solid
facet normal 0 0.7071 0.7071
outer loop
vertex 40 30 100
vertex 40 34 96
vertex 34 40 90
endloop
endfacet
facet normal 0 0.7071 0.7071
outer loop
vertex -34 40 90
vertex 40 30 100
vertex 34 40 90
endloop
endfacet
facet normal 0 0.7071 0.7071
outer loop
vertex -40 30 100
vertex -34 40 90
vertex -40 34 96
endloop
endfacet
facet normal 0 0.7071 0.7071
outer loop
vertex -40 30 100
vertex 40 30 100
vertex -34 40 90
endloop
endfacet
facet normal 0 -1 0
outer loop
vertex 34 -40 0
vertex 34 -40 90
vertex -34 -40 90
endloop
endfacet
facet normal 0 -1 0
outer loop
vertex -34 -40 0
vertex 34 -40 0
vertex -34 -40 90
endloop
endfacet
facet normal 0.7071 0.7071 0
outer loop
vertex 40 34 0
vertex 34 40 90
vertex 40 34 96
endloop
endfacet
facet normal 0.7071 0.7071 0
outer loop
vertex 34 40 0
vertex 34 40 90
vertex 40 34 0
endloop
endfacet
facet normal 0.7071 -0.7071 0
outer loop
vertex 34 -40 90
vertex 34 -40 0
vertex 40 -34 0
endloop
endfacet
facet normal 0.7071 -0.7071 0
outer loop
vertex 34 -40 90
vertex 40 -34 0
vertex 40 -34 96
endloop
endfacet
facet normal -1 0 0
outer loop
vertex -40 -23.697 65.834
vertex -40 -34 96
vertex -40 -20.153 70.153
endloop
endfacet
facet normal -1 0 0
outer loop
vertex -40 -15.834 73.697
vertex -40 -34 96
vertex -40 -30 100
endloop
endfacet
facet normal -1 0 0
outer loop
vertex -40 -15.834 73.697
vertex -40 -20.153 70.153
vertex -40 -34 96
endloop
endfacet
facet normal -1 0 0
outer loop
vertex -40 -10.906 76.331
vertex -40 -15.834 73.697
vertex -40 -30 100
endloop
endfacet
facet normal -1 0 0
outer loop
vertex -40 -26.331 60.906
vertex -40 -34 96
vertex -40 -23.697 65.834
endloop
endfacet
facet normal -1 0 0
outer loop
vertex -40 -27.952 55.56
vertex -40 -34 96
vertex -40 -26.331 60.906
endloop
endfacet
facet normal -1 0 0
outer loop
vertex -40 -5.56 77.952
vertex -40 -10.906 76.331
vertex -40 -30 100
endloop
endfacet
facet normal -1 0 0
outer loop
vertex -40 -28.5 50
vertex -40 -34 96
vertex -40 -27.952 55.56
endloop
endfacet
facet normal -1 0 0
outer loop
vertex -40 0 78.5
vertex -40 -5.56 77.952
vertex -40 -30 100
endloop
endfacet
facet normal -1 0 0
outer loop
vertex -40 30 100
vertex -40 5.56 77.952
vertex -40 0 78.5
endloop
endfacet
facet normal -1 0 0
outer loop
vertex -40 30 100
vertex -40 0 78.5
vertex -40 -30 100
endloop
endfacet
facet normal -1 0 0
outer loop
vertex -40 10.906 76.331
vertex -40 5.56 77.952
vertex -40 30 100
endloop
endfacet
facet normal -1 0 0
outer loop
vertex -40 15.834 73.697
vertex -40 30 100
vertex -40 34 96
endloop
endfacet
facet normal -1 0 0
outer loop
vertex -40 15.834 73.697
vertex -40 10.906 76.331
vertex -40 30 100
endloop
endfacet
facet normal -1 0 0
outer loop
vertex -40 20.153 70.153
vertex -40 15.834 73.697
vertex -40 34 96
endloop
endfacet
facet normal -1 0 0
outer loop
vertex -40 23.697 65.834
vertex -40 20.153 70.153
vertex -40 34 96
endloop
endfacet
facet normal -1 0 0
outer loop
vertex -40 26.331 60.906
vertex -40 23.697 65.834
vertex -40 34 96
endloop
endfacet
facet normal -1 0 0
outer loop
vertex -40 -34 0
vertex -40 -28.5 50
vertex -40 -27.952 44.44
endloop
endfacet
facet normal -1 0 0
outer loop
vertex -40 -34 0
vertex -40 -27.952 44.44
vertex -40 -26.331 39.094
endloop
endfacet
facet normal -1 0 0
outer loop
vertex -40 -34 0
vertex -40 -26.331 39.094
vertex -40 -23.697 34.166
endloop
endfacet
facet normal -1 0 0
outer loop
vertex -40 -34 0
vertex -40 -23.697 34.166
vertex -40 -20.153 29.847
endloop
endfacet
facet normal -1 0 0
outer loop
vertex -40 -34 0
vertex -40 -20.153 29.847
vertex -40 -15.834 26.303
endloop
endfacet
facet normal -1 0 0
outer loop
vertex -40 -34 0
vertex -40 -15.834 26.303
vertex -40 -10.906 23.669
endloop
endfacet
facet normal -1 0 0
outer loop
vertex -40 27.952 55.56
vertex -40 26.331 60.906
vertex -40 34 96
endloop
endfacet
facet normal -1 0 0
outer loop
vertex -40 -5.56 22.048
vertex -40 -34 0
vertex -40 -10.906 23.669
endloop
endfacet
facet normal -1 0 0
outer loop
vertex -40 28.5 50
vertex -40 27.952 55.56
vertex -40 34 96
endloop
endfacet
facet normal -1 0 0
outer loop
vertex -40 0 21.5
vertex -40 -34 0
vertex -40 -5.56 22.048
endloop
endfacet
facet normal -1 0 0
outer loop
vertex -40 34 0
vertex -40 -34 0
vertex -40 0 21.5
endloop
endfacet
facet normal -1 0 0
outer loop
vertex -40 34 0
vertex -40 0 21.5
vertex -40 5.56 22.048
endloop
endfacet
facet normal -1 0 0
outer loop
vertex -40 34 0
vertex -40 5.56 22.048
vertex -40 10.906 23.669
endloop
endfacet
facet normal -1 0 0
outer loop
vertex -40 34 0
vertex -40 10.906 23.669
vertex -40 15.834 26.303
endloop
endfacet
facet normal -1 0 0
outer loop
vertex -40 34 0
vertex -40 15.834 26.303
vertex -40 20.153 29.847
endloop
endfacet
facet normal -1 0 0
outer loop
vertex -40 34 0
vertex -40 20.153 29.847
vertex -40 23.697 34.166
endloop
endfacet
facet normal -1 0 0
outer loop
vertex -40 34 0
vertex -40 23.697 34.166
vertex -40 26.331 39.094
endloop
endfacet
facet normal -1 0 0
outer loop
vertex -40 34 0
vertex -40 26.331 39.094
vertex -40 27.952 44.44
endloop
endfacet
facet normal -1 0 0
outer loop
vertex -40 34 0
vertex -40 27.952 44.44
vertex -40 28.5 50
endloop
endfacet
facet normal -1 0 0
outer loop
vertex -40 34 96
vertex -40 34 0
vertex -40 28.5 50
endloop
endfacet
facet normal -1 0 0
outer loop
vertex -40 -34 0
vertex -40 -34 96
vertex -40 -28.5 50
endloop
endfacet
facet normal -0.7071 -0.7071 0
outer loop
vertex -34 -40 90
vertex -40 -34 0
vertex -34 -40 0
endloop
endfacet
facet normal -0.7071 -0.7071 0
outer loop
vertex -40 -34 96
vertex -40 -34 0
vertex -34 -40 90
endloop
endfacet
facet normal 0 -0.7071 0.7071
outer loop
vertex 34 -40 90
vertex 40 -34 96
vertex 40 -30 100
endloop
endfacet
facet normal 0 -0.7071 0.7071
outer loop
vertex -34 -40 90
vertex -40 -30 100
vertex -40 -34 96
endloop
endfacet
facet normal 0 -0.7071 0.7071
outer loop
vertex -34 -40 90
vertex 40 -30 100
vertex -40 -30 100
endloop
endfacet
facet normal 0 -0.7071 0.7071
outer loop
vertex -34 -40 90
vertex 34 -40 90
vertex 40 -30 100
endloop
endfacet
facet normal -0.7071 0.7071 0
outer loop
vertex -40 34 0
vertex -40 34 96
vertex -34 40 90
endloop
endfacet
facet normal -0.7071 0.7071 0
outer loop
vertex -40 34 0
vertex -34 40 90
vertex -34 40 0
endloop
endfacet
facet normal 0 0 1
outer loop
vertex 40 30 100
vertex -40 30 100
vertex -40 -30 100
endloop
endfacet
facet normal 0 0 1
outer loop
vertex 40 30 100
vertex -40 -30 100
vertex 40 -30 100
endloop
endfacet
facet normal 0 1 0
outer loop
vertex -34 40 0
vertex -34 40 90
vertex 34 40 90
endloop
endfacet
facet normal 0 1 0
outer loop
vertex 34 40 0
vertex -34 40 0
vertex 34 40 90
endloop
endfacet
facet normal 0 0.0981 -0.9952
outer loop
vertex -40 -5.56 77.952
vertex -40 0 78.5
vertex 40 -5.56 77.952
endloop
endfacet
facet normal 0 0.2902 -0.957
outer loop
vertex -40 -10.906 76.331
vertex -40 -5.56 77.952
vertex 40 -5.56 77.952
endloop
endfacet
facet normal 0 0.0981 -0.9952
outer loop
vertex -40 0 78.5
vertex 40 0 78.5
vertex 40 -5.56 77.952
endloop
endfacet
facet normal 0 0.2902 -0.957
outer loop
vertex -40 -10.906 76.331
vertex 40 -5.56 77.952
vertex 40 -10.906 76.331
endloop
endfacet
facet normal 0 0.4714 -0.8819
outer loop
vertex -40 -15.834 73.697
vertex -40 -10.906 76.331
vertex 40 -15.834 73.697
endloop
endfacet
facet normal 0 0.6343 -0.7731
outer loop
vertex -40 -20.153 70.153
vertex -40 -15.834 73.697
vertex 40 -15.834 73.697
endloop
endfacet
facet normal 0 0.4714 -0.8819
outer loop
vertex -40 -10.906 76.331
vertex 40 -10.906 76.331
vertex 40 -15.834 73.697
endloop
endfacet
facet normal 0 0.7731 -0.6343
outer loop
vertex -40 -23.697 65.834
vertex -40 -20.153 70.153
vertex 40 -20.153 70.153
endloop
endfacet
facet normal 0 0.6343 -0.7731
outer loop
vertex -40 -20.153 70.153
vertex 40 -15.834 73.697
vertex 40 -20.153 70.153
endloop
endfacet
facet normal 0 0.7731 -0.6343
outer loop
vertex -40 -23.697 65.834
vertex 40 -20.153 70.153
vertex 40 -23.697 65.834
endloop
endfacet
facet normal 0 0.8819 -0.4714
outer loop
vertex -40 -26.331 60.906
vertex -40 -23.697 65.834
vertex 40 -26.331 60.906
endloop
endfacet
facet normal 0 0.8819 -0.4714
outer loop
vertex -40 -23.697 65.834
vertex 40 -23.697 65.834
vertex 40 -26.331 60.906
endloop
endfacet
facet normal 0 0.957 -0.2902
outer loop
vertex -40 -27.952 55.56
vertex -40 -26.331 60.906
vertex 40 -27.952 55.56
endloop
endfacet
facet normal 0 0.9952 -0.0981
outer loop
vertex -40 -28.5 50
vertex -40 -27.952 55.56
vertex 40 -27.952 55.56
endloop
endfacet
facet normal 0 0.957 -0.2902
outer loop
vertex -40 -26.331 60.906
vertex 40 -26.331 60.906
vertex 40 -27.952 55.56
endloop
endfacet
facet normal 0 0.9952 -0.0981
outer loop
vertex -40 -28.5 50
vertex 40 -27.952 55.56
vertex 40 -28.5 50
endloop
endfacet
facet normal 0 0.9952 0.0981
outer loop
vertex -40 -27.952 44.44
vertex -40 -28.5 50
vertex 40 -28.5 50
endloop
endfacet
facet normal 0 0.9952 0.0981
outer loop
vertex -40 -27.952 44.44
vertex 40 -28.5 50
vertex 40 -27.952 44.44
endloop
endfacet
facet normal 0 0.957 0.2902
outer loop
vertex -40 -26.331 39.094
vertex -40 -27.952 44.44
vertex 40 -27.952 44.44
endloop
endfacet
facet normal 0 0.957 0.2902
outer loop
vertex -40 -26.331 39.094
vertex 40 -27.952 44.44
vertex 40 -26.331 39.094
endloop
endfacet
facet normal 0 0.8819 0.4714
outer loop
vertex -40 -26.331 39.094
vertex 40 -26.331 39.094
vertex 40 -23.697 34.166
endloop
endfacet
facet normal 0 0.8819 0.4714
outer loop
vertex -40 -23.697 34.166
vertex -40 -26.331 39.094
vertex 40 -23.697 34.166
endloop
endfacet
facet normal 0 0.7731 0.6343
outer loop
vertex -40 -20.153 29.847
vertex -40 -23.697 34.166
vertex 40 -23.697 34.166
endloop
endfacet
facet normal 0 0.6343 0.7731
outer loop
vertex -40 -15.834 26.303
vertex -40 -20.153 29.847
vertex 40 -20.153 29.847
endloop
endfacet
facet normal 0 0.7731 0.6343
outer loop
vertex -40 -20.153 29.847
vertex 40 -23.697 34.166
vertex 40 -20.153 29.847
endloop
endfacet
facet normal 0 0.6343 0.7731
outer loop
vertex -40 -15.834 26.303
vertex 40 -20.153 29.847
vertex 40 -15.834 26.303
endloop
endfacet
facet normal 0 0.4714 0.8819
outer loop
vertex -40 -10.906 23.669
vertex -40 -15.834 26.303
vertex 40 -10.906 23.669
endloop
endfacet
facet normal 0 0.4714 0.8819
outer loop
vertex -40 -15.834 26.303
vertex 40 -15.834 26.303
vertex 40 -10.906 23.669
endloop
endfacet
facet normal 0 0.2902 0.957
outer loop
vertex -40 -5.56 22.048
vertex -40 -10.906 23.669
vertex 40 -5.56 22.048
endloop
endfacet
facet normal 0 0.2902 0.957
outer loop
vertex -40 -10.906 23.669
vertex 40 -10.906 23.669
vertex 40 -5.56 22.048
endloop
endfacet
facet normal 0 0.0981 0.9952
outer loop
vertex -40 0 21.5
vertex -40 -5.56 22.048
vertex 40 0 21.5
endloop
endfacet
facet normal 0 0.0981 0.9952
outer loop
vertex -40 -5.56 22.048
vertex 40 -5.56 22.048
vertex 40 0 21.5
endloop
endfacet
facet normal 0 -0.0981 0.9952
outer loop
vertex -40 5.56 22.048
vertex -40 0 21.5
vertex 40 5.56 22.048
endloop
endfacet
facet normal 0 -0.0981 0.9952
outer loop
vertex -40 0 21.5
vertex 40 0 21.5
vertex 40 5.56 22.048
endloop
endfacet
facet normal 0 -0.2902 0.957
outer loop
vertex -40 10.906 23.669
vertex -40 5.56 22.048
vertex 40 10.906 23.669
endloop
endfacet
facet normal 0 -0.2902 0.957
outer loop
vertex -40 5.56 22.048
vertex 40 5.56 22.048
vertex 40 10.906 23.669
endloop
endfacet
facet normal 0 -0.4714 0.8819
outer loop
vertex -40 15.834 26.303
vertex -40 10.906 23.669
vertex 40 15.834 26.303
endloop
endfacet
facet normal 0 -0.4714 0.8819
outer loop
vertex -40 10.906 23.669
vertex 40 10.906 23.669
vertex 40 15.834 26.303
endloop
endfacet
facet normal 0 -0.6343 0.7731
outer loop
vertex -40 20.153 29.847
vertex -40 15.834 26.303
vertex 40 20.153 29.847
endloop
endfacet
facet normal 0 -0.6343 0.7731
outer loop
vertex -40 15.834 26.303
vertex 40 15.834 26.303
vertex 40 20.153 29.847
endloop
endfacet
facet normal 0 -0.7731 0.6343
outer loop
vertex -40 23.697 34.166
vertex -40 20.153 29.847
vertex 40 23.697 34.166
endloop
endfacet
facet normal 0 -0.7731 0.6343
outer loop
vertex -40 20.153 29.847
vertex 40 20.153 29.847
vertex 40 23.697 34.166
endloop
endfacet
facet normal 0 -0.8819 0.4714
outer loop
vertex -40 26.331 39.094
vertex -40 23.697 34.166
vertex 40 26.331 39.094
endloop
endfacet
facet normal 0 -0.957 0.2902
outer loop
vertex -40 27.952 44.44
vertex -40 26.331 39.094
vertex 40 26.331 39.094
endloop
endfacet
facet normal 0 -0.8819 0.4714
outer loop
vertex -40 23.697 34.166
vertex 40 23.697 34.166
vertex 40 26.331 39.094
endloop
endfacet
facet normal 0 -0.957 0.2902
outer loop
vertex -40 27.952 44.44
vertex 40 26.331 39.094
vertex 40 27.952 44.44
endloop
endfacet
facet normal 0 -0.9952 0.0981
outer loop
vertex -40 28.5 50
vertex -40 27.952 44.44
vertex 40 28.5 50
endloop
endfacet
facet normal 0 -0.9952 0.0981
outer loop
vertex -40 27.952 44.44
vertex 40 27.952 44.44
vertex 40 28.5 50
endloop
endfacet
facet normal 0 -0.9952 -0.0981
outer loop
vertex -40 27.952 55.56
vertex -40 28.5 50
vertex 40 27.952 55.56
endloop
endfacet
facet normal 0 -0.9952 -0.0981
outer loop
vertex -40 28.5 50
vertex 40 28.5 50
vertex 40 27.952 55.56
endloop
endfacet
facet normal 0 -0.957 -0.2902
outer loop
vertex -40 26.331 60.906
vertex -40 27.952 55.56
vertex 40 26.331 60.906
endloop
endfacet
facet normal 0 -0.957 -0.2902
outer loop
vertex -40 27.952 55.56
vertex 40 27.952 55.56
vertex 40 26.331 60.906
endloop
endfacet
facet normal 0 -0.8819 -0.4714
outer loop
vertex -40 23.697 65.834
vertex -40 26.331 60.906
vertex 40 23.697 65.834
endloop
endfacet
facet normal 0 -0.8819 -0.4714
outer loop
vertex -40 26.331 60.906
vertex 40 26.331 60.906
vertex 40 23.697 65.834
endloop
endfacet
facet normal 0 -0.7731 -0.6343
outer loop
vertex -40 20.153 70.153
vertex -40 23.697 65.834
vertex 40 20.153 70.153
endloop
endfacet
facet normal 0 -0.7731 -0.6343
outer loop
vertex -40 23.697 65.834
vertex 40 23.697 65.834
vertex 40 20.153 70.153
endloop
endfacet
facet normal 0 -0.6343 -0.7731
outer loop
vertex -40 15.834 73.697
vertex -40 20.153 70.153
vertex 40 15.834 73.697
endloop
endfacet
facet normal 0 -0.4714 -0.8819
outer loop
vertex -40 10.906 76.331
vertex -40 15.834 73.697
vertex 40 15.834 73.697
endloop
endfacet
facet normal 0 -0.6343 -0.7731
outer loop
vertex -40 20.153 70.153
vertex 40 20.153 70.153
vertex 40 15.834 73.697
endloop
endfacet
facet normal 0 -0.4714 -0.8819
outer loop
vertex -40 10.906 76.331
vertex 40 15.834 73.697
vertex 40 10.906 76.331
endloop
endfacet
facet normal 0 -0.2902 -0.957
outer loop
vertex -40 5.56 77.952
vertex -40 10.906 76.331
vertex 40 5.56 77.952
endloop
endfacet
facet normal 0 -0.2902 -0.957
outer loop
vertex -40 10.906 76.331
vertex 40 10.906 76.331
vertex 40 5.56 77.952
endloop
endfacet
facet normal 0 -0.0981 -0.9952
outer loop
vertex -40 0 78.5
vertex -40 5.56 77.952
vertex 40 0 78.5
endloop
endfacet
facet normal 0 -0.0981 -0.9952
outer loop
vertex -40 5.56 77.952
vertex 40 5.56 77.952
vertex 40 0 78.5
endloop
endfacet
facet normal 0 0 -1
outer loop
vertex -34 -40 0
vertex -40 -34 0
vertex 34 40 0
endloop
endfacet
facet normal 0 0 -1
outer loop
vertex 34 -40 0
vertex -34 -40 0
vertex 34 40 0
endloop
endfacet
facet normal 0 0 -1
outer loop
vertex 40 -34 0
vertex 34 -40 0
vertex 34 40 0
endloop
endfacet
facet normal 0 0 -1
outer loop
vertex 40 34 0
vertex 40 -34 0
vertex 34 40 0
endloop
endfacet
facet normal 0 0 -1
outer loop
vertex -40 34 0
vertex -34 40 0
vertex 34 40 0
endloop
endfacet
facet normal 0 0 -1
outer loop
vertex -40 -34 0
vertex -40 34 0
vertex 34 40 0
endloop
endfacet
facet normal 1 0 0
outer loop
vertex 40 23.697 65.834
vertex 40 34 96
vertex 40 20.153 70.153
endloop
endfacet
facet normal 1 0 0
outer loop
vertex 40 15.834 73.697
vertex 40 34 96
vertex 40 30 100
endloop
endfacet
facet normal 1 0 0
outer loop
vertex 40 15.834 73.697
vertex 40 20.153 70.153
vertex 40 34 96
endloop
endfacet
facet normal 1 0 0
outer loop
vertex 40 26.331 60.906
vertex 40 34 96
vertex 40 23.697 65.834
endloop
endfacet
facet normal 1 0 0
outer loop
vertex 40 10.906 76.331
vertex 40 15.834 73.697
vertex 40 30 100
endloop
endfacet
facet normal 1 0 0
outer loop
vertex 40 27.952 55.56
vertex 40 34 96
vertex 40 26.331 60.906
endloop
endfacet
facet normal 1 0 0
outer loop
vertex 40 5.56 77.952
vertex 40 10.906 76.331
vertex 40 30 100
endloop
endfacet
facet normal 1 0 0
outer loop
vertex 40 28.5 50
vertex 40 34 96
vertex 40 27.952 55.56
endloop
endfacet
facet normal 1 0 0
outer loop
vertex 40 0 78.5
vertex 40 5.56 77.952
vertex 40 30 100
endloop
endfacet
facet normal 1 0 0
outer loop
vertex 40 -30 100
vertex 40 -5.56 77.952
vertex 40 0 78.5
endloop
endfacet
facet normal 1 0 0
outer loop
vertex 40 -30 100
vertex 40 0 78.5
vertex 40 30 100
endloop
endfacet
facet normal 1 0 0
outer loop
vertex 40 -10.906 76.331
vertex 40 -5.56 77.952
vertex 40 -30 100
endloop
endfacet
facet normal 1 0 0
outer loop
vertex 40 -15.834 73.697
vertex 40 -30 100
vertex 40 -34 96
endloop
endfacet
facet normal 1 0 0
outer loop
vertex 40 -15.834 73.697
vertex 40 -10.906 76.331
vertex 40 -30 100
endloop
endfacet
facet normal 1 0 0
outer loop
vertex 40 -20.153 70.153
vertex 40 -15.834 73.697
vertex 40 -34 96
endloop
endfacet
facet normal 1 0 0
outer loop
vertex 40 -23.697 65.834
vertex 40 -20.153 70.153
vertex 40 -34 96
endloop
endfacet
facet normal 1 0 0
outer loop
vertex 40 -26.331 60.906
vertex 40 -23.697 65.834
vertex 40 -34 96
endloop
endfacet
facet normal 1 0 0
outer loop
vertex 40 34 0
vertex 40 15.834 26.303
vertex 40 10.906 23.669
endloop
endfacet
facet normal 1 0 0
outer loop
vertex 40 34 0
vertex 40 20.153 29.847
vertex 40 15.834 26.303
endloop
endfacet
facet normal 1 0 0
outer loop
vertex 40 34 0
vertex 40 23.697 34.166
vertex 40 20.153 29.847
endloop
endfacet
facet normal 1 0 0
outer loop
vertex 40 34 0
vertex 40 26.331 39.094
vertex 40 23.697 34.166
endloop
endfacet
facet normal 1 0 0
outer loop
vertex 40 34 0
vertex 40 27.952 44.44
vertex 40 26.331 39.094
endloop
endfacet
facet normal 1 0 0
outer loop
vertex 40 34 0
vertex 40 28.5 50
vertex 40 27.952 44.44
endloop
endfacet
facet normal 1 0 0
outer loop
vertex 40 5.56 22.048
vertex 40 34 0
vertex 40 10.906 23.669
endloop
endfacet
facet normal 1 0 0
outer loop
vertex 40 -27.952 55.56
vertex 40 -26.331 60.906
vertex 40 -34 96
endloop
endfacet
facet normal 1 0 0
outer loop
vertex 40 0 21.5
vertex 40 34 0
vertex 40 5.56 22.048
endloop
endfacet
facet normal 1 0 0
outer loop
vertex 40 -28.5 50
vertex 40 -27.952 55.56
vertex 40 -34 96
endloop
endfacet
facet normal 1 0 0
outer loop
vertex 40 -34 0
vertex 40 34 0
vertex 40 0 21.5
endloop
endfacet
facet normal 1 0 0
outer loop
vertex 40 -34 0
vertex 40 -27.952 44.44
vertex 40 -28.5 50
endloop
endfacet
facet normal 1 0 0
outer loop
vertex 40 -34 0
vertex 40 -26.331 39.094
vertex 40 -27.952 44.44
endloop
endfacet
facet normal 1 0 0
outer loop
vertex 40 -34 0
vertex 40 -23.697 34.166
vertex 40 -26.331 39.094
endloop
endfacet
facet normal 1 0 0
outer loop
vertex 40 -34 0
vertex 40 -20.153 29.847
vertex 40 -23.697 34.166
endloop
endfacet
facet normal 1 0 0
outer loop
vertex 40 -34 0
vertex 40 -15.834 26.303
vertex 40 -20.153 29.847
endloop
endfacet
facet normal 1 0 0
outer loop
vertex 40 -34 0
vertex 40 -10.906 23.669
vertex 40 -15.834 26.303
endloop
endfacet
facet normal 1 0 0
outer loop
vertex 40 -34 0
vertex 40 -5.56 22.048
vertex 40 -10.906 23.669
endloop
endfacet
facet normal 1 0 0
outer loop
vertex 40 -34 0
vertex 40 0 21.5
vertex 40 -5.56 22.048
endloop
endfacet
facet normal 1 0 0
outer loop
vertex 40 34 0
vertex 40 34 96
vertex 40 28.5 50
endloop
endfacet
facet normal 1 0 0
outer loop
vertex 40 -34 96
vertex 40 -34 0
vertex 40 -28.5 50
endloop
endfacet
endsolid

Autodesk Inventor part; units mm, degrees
ref_plane "YZ Plane" through (0, 0, 0) normal (1, 0, 0) x (0, 1, 0)
ref_plane "XZ Plane" through (0, 0, 0) normal (0, 1, 0) x (-1, 0, 0)
ref_plane "XY Plane" through (0, 0, 0) normal (0, 0, 1) x (1, 0, 0)
sketch "Sketch1" plane through (0, 0, 0) normal (0, 0, 1) x (1, 0, 0)
  line L0 (40, 40) -> (40, -40)
  line L1 (40, -40) -> (-40, -40)
  line L2 (-40, -40) -> (-40, 40)
  line L3 (-40, 40) -> (40, 40)
  point P0 (0, 0)
  point P1 (0, 0)
  dimension "d0" = 80
extrude "Extrusion1" add sketch "Sketch1" along normal blind 100
sketch "Sketch2" plane through (-40, -40, 0) normal (-1, 0, 0) x (0, 0, 1)
  line L0 (100, 0) -> (100, 80) projected
  line L1 (0, 80) -> (100, 80) projected
  point P0 (50, 40)
  dimension "d3" = 50
  dimension "d4" = 40
hole "Hole1" at (-40, 0, 50) direction (1, 0, 0) diameter 57 end through all
chamfer "Chamfer2" distance 10 angle 45 2 edges at (0, -40, 100) (0, 40, 100)
chamfer "Chamfer1" distance 6 angle 45 4 edges at (-40, 40, 45) (40, 40, 45) (-40, -40, 45) (40, -40, 45)
properties part number "3136 1094 56" material "Steel, Mild"
